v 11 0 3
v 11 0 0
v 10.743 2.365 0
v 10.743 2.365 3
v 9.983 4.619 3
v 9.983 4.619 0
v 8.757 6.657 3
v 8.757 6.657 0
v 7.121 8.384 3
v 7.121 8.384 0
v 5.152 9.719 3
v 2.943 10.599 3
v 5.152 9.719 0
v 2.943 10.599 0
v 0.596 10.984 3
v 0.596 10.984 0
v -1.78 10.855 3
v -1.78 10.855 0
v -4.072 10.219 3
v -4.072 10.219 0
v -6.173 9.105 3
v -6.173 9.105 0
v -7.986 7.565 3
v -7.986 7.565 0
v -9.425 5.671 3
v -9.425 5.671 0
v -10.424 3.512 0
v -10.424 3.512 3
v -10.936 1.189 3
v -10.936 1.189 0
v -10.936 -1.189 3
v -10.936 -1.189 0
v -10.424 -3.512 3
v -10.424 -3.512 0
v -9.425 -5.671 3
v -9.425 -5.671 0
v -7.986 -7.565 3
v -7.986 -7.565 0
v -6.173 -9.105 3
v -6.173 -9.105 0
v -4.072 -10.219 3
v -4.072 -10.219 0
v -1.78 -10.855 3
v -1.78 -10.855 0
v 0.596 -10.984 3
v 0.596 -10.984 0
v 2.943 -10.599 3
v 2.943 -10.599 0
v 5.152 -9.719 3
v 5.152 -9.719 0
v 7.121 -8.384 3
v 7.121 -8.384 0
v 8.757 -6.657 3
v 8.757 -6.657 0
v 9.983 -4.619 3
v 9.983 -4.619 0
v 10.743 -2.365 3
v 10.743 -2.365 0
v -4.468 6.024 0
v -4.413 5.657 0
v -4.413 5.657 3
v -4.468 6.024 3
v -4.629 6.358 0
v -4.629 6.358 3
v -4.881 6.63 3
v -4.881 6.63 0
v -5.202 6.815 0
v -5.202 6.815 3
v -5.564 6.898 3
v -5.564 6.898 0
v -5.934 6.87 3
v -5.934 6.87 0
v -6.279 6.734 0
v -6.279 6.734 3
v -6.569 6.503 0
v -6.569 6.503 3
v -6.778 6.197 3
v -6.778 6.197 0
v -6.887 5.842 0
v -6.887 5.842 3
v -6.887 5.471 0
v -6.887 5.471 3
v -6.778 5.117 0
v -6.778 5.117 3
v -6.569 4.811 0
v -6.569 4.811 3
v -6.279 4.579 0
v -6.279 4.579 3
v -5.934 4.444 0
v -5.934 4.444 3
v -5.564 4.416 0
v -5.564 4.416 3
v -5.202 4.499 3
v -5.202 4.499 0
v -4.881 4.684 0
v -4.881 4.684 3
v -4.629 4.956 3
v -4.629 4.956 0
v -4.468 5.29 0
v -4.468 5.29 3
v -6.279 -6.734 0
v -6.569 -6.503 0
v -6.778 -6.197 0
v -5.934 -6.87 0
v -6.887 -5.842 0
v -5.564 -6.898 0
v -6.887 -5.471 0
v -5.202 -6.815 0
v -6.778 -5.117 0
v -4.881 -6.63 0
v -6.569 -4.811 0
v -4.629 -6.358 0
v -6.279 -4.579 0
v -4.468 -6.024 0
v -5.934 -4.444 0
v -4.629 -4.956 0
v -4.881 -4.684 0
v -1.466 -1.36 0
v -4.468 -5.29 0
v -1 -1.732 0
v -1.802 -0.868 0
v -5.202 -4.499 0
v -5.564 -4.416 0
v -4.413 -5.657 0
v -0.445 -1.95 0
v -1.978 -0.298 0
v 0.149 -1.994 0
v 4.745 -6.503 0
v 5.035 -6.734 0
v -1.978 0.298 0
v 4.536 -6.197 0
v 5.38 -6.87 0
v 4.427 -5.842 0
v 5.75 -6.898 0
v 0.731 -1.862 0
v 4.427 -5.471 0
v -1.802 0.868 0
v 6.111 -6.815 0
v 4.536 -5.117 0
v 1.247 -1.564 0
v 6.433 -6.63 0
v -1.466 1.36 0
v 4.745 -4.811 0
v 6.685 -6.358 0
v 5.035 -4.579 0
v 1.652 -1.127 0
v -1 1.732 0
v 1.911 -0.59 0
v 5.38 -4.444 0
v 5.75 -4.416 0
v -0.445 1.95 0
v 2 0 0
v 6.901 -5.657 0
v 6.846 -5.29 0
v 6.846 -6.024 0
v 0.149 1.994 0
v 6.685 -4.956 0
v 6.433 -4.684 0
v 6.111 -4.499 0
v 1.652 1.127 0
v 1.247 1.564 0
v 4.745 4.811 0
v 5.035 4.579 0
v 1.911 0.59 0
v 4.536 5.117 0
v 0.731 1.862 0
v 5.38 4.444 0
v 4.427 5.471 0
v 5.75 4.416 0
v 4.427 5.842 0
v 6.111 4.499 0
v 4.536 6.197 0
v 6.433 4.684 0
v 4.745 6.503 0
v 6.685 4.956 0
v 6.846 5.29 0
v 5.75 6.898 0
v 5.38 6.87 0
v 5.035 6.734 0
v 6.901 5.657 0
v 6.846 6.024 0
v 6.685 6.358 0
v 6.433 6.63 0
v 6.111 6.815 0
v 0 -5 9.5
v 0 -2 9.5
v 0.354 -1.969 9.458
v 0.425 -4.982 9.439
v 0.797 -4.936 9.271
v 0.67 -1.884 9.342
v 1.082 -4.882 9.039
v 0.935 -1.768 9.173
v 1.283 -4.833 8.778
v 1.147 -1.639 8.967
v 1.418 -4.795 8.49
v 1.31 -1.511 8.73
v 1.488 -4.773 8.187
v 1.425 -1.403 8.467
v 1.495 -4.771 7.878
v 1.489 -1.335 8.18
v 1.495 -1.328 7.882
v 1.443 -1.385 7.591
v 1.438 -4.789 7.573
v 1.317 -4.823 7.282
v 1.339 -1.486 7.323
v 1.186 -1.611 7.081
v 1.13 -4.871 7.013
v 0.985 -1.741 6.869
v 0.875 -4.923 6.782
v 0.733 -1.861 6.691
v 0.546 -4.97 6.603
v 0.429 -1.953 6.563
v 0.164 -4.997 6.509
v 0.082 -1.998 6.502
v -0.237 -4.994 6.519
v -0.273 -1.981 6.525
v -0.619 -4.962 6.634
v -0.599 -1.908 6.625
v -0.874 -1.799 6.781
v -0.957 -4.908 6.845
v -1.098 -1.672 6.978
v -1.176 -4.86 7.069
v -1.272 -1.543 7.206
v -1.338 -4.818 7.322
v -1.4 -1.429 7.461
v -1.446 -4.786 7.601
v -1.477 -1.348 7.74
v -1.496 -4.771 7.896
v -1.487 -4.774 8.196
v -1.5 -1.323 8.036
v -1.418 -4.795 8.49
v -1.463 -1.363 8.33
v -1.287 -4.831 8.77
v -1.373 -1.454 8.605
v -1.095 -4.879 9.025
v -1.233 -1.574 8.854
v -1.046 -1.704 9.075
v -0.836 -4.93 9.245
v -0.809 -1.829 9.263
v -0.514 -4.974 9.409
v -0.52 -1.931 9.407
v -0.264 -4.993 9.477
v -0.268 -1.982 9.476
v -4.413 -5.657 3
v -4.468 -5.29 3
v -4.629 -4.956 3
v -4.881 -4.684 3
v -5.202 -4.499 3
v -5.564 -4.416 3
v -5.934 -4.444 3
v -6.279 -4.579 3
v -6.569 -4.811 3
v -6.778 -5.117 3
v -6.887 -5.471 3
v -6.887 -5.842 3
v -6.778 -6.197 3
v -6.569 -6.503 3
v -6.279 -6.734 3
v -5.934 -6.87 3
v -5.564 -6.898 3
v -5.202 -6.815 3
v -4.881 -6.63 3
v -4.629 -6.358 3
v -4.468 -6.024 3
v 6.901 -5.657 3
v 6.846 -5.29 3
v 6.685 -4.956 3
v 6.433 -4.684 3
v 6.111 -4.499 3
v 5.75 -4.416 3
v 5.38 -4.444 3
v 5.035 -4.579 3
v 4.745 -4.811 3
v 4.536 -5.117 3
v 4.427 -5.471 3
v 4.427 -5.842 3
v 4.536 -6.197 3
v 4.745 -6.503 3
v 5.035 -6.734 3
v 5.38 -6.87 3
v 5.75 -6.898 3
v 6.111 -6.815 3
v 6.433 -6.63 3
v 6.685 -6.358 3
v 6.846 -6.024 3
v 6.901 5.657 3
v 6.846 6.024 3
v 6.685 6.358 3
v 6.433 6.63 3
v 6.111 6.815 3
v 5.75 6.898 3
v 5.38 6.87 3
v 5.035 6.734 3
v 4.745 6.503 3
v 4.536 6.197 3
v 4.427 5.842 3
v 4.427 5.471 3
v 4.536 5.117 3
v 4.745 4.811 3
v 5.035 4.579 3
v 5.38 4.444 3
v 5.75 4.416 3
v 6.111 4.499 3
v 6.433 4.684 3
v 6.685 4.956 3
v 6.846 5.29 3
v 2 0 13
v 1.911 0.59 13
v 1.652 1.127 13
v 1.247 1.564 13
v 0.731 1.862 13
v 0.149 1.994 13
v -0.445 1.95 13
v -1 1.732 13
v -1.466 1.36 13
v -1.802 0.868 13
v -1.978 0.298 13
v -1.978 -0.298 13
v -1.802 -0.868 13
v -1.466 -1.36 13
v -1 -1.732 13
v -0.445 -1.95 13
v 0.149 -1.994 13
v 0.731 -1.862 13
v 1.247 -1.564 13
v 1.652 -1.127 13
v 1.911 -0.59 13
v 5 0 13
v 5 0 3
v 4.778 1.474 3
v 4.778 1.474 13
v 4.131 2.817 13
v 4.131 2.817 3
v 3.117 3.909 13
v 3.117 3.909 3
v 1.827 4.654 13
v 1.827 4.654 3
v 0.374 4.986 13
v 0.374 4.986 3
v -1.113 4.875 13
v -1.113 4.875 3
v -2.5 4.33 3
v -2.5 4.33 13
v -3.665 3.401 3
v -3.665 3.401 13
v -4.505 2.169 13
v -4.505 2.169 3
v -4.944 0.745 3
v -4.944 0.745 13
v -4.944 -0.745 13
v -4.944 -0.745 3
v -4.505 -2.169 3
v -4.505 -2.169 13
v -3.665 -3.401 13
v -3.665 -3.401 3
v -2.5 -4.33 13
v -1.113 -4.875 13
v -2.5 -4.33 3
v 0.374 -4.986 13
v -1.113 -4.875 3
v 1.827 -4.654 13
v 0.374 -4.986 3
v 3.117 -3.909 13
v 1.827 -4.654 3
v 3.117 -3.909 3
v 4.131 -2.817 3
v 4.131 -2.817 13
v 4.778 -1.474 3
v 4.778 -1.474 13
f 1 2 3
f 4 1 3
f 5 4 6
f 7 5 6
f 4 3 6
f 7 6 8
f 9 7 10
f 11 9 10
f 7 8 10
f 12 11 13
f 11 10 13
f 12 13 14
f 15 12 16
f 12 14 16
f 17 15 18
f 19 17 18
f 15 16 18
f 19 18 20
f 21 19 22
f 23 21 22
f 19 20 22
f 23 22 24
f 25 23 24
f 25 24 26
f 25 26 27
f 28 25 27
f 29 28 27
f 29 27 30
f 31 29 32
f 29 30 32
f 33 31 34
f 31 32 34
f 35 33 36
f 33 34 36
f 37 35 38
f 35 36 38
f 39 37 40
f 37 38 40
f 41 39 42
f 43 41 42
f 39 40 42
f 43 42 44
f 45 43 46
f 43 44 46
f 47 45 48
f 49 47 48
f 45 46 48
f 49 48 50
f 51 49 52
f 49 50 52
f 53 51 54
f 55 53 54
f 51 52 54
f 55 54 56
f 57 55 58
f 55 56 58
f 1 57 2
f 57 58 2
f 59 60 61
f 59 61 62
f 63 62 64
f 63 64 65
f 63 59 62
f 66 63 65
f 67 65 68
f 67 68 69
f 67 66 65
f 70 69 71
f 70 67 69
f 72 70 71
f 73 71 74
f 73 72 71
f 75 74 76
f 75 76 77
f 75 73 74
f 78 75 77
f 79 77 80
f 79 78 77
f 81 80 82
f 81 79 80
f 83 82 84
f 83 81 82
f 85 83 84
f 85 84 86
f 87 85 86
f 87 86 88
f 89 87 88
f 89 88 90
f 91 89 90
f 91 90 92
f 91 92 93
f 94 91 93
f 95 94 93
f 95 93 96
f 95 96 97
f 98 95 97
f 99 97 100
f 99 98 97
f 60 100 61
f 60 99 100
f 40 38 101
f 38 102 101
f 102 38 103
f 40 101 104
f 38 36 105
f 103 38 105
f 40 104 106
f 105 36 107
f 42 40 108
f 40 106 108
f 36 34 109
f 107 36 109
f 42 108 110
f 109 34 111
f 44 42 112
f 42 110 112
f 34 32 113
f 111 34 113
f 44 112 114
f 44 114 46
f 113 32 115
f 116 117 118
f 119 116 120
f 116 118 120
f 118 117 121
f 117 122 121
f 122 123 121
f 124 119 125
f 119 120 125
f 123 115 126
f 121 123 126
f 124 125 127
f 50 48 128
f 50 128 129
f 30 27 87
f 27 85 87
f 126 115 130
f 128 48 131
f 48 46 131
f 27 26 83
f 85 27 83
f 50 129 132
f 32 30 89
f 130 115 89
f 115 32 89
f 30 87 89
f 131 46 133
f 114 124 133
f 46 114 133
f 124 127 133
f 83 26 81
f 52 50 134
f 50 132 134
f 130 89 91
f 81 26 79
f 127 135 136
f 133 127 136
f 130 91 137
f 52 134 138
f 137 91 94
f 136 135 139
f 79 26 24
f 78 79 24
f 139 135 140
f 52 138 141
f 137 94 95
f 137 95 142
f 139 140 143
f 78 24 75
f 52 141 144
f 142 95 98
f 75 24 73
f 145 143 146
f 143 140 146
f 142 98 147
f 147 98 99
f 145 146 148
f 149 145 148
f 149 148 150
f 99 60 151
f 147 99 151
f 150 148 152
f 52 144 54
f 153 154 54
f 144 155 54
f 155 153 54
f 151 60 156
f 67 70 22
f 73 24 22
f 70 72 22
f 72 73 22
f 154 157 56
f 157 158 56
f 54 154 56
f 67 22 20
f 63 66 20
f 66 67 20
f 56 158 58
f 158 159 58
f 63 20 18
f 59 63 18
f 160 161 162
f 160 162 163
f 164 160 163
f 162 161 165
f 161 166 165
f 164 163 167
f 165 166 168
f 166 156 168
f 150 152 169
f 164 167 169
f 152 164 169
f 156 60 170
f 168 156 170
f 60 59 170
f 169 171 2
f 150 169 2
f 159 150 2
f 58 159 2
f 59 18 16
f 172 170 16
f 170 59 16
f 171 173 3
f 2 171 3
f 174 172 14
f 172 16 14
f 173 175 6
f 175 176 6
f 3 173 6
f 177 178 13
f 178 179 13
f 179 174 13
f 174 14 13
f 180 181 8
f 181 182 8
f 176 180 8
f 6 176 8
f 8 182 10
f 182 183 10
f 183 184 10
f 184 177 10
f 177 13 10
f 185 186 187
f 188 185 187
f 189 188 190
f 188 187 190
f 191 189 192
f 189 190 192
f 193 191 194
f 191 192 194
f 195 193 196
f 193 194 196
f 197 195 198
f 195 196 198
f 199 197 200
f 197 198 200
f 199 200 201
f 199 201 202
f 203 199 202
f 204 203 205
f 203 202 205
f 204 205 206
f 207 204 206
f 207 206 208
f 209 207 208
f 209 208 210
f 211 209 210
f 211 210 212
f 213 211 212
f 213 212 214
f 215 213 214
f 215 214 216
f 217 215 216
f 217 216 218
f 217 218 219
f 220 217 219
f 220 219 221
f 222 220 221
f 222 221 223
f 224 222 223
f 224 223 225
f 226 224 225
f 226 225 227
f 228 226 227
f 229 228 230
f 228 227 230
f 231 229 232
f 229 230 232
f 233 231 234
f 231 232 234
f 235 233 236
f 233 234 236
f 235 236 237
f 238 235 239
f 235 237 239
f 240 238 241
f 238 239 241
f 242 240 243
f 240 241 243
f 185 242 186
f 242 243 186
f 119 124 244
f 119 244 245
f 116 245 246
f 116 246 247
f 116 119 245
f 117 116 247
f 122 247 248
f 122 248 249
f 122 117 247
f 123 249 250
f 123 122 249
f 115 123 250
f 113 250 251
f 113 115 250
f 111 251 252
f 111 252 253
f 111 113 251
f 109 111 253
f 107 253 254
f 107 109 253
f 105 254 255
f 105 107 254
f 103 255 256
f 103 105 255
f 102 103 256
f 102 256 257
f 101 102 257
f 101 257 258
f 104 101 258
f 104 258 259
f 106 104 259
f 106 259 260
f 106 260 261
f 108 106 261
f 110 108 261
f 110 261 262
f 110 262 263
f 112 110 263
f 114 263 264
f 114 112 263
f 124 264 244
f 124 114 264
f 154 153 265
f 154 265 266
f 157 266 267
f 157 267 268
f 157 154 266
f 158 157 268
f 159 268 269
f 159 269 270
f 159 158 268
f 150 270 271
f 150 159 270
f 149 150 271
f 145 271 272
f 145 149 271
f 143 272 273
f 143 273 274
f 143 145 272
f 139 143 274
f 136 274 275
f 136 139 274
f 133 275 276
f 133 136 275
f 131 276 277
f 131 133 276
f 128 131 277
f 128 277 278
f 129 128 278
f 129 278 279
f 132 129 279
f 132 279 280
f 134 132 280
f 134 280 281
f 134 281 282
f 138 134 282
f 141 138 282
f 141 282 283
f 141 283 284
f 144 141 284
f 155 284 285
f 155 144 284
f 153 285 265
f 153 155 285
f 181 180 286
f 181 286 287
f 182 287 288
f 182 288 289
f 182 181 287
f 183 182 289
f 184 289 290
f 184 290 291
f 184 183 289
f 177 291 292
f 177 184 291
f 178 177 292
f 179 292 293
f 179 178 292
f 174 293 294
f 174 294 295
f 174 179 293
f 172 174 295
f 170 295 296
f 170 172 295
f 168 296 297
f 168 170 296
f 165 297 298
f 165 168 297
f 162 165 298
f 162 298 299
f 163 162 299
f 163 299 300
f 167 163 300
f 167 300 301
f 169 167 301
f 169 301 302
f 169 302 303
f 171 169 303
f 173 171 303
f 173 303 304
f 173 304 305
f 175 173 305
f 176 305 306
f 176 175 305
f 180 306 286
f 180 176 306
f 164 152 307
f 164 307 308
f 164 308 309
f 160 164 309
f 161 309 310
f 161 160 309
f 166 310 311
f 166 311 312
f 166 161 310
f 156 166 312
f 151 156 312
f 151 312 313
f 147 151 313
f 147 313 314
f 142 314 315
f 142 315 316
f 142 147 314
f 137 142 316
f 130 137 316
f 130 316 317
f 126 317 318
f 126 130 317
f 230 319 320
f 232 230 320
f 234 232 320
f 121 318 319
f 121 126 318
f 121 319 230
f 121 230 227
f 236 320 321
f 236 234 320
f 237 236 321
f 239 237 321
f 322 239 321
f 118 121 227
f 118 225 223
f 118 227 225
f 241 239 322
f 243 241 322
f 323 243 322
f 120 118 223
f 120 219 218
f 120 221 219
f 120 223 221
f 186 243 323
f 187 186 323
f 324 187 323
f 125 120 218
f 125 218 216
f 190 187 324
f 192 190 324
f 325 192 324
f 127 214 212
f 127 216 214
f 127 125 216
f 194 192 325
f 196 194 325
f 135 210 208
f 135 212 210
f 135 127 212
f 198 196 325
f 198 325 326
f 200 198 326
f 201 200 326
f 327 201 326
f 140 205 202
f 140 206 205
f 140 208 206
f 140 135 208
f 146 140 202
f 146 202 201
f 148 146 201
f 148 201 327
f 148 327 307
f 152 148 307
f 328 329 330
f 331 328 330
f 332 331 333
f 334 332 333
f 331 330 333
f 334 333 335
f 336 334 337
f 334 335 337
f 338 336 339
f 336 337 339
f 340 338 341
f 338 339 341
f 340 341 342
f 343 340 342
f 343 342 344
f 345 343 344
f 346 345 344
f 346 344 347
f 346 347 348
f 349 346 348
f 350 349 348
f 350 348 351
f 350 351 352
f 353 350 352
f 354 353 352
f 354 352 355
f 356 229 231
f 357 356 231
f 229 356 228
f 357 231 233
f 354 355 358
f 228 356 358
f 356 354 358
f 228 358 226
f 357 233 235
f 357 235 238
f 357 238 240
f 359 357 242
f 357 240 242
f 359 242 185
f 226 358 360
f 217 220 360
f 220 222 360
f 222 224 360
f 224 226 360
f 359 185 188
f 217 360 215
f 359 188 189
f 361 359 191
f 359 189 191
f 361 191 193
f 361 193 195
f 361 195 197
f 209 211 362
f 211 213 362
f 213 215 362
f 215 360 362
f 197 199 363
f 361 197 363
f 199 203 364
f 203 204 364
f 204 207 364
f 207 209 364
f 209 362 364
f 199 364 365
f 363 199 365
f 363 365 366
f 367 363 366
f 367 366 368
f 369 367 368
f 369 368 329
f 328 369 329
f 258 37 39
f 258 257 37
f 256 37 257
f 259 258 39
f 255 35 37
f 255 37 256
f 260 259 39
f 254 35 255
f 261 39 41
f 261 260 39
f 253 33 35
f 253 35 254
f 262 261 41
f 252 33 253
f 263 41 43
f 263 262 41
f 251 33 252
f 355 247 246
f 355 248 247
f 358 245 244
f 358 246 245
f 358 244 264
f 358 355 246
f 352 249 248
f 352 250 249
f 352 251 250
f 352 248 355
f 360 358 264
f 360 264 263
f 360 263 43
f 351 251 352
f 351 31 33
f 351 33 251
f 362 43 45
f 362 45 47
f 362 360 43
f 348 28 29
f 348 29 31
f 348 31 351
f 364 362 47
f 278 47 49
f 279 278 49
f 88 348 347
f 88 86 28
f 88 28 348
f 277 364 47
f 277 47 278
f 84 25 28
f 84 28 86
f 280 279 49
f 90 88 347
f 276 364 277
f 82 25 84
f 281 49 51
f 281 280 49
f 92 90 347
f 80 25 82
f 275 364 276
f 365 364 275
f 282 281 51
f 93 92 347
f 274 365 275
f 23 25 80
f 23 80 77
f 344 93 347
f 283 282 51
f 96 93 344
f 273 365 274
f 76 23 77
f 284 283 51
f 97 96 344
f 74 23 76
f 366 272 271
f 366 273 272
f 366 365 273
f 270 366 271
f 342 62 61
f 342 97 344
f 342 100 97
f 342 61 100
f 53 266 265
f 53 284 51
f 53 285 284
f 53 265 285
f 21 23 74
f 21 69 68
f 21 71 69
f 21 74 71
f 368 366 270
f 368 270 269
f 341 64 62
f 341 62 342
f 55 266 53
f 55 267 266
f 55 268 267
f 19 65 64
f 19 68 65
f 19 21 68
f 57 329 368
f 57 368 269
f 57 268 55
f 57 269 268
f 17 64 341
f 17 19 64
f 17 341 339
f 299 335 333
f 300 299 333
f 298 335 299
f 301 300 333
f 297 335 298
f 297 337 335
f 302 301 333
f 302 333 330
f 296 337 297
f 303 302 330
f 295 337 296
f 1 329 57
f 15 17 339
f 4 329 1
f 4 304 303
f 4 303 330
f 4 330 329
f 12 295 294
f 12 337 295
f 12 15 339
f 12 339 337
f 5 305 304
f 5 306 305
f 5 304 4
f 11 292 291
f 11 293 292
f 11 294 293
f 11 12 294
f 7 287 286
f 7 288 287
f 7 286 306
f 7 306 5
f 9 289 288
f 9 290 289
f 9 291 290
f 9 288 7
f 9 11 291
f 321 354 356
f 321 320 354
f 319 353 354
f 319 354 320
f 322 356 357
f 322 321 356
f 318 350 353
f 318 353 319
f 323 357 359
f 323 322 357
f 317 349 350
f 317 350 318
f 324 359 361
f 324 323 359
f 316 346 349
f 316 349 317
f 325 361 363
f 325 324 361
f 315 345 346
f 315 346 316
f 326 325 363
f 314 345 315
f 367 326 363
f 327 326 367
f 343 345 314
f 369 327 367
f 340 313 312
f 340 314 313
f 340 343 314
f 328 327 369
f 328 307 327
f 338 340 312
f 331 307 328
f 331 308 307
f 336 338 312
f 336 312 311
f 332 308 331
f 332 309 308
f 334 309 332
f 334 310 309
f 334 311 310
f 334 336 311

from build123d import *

# Parameters (mm, degrees)
SKETCH2_R               = 11
SKETCH2_R_2             = 2
SKETCH2_R_3             = 1.244152151
BOSS_EXTRUDE1_DEPTH     = 3
SKETCH3_R               = 5
SKETCH3_R_2             = 2
BOSS_EXTRUDE3_DEPTH     = 10
CUT_EXTRUDE2_REACH      = 22.273
CUT_EXTRUDE2_END_RADIUS = 5
SKETCH6_R               = 1.5


with BuildPart() as part:
    # Sketch2 → Boss-Extrude1 (new body)
    with BuildSketch(Plane.XY):
        Circle(SKETCH2_R)
        Circle(SKETCH2_R_2, mode=Mode.SUBTRACT)
        with Locations((-5.656854249, 5.656854249)):
            Circle(SKETCH2_R_3, mode=Mode.SUBTRACT)
        with Locations((5.656854249, 5.656854249)):
            Circle(SKETCH2_R_3, mode=Mode.SUBTRACT)
        with Locations((5.656854249, -5.656854249)):
            Circle(SKETCH2_R_3, mode=Mode.SUBTRACT)
        with Locations((-5.656854249, -5.656854249)):
            Circle(SKETCH2_R_3, mode=Mode.SUBTRACT)
    extrude(amount=BOSS_EXTRUDE1_DEPTH)

    # Sketch3 → Boss-Extrude3 (add)
    with BuildSketch(Plane.XY.offset(3)):
        Circle(SKETCH3_R)
        Circle(SKETCH3_R_2, mode=Mode.SUBTRACT)
    extrude(amount=BOSS_EXTRUDE3_DEPTH)

    # Cut-Extrude2: up to this cylinder (the profile starts inside it)
    cut_extrude2_end = Plane(origin=(0, 0, 8), z_dir=(0, 0, -1)) * Cylinder(CUT_EXTRUDE2_END_RADIUS, 55.546, mode=Mode.PRIVATE)
    # Sketch6 → Cut-Extrude2 (cut, up to the surface)
    with BuildSketch(Plane(origin=(0, 0, 0), x_dir=(1, 0, 0), z_dir=(0, 1, 0)), mode=Mode.PRIVATE) as cut_extrude2_sk1:
        with Locations(Location((0, -8, 0), (0, 0, 270))):
            Circle(SKETCH6_R)
    cut_extrude2_tool1 = extrude(cut_extrude2_sk1.sketch, amount=-CUT_EXTRUDE2_REACH, mode=Mode.PRIVATE) & cut_extrude2_end
    add(cut_extrude2_tool1.solids().sort_by_distance((0, 0, 8))[0], mode=Mode.SUBTRACT)


solid = part.part
